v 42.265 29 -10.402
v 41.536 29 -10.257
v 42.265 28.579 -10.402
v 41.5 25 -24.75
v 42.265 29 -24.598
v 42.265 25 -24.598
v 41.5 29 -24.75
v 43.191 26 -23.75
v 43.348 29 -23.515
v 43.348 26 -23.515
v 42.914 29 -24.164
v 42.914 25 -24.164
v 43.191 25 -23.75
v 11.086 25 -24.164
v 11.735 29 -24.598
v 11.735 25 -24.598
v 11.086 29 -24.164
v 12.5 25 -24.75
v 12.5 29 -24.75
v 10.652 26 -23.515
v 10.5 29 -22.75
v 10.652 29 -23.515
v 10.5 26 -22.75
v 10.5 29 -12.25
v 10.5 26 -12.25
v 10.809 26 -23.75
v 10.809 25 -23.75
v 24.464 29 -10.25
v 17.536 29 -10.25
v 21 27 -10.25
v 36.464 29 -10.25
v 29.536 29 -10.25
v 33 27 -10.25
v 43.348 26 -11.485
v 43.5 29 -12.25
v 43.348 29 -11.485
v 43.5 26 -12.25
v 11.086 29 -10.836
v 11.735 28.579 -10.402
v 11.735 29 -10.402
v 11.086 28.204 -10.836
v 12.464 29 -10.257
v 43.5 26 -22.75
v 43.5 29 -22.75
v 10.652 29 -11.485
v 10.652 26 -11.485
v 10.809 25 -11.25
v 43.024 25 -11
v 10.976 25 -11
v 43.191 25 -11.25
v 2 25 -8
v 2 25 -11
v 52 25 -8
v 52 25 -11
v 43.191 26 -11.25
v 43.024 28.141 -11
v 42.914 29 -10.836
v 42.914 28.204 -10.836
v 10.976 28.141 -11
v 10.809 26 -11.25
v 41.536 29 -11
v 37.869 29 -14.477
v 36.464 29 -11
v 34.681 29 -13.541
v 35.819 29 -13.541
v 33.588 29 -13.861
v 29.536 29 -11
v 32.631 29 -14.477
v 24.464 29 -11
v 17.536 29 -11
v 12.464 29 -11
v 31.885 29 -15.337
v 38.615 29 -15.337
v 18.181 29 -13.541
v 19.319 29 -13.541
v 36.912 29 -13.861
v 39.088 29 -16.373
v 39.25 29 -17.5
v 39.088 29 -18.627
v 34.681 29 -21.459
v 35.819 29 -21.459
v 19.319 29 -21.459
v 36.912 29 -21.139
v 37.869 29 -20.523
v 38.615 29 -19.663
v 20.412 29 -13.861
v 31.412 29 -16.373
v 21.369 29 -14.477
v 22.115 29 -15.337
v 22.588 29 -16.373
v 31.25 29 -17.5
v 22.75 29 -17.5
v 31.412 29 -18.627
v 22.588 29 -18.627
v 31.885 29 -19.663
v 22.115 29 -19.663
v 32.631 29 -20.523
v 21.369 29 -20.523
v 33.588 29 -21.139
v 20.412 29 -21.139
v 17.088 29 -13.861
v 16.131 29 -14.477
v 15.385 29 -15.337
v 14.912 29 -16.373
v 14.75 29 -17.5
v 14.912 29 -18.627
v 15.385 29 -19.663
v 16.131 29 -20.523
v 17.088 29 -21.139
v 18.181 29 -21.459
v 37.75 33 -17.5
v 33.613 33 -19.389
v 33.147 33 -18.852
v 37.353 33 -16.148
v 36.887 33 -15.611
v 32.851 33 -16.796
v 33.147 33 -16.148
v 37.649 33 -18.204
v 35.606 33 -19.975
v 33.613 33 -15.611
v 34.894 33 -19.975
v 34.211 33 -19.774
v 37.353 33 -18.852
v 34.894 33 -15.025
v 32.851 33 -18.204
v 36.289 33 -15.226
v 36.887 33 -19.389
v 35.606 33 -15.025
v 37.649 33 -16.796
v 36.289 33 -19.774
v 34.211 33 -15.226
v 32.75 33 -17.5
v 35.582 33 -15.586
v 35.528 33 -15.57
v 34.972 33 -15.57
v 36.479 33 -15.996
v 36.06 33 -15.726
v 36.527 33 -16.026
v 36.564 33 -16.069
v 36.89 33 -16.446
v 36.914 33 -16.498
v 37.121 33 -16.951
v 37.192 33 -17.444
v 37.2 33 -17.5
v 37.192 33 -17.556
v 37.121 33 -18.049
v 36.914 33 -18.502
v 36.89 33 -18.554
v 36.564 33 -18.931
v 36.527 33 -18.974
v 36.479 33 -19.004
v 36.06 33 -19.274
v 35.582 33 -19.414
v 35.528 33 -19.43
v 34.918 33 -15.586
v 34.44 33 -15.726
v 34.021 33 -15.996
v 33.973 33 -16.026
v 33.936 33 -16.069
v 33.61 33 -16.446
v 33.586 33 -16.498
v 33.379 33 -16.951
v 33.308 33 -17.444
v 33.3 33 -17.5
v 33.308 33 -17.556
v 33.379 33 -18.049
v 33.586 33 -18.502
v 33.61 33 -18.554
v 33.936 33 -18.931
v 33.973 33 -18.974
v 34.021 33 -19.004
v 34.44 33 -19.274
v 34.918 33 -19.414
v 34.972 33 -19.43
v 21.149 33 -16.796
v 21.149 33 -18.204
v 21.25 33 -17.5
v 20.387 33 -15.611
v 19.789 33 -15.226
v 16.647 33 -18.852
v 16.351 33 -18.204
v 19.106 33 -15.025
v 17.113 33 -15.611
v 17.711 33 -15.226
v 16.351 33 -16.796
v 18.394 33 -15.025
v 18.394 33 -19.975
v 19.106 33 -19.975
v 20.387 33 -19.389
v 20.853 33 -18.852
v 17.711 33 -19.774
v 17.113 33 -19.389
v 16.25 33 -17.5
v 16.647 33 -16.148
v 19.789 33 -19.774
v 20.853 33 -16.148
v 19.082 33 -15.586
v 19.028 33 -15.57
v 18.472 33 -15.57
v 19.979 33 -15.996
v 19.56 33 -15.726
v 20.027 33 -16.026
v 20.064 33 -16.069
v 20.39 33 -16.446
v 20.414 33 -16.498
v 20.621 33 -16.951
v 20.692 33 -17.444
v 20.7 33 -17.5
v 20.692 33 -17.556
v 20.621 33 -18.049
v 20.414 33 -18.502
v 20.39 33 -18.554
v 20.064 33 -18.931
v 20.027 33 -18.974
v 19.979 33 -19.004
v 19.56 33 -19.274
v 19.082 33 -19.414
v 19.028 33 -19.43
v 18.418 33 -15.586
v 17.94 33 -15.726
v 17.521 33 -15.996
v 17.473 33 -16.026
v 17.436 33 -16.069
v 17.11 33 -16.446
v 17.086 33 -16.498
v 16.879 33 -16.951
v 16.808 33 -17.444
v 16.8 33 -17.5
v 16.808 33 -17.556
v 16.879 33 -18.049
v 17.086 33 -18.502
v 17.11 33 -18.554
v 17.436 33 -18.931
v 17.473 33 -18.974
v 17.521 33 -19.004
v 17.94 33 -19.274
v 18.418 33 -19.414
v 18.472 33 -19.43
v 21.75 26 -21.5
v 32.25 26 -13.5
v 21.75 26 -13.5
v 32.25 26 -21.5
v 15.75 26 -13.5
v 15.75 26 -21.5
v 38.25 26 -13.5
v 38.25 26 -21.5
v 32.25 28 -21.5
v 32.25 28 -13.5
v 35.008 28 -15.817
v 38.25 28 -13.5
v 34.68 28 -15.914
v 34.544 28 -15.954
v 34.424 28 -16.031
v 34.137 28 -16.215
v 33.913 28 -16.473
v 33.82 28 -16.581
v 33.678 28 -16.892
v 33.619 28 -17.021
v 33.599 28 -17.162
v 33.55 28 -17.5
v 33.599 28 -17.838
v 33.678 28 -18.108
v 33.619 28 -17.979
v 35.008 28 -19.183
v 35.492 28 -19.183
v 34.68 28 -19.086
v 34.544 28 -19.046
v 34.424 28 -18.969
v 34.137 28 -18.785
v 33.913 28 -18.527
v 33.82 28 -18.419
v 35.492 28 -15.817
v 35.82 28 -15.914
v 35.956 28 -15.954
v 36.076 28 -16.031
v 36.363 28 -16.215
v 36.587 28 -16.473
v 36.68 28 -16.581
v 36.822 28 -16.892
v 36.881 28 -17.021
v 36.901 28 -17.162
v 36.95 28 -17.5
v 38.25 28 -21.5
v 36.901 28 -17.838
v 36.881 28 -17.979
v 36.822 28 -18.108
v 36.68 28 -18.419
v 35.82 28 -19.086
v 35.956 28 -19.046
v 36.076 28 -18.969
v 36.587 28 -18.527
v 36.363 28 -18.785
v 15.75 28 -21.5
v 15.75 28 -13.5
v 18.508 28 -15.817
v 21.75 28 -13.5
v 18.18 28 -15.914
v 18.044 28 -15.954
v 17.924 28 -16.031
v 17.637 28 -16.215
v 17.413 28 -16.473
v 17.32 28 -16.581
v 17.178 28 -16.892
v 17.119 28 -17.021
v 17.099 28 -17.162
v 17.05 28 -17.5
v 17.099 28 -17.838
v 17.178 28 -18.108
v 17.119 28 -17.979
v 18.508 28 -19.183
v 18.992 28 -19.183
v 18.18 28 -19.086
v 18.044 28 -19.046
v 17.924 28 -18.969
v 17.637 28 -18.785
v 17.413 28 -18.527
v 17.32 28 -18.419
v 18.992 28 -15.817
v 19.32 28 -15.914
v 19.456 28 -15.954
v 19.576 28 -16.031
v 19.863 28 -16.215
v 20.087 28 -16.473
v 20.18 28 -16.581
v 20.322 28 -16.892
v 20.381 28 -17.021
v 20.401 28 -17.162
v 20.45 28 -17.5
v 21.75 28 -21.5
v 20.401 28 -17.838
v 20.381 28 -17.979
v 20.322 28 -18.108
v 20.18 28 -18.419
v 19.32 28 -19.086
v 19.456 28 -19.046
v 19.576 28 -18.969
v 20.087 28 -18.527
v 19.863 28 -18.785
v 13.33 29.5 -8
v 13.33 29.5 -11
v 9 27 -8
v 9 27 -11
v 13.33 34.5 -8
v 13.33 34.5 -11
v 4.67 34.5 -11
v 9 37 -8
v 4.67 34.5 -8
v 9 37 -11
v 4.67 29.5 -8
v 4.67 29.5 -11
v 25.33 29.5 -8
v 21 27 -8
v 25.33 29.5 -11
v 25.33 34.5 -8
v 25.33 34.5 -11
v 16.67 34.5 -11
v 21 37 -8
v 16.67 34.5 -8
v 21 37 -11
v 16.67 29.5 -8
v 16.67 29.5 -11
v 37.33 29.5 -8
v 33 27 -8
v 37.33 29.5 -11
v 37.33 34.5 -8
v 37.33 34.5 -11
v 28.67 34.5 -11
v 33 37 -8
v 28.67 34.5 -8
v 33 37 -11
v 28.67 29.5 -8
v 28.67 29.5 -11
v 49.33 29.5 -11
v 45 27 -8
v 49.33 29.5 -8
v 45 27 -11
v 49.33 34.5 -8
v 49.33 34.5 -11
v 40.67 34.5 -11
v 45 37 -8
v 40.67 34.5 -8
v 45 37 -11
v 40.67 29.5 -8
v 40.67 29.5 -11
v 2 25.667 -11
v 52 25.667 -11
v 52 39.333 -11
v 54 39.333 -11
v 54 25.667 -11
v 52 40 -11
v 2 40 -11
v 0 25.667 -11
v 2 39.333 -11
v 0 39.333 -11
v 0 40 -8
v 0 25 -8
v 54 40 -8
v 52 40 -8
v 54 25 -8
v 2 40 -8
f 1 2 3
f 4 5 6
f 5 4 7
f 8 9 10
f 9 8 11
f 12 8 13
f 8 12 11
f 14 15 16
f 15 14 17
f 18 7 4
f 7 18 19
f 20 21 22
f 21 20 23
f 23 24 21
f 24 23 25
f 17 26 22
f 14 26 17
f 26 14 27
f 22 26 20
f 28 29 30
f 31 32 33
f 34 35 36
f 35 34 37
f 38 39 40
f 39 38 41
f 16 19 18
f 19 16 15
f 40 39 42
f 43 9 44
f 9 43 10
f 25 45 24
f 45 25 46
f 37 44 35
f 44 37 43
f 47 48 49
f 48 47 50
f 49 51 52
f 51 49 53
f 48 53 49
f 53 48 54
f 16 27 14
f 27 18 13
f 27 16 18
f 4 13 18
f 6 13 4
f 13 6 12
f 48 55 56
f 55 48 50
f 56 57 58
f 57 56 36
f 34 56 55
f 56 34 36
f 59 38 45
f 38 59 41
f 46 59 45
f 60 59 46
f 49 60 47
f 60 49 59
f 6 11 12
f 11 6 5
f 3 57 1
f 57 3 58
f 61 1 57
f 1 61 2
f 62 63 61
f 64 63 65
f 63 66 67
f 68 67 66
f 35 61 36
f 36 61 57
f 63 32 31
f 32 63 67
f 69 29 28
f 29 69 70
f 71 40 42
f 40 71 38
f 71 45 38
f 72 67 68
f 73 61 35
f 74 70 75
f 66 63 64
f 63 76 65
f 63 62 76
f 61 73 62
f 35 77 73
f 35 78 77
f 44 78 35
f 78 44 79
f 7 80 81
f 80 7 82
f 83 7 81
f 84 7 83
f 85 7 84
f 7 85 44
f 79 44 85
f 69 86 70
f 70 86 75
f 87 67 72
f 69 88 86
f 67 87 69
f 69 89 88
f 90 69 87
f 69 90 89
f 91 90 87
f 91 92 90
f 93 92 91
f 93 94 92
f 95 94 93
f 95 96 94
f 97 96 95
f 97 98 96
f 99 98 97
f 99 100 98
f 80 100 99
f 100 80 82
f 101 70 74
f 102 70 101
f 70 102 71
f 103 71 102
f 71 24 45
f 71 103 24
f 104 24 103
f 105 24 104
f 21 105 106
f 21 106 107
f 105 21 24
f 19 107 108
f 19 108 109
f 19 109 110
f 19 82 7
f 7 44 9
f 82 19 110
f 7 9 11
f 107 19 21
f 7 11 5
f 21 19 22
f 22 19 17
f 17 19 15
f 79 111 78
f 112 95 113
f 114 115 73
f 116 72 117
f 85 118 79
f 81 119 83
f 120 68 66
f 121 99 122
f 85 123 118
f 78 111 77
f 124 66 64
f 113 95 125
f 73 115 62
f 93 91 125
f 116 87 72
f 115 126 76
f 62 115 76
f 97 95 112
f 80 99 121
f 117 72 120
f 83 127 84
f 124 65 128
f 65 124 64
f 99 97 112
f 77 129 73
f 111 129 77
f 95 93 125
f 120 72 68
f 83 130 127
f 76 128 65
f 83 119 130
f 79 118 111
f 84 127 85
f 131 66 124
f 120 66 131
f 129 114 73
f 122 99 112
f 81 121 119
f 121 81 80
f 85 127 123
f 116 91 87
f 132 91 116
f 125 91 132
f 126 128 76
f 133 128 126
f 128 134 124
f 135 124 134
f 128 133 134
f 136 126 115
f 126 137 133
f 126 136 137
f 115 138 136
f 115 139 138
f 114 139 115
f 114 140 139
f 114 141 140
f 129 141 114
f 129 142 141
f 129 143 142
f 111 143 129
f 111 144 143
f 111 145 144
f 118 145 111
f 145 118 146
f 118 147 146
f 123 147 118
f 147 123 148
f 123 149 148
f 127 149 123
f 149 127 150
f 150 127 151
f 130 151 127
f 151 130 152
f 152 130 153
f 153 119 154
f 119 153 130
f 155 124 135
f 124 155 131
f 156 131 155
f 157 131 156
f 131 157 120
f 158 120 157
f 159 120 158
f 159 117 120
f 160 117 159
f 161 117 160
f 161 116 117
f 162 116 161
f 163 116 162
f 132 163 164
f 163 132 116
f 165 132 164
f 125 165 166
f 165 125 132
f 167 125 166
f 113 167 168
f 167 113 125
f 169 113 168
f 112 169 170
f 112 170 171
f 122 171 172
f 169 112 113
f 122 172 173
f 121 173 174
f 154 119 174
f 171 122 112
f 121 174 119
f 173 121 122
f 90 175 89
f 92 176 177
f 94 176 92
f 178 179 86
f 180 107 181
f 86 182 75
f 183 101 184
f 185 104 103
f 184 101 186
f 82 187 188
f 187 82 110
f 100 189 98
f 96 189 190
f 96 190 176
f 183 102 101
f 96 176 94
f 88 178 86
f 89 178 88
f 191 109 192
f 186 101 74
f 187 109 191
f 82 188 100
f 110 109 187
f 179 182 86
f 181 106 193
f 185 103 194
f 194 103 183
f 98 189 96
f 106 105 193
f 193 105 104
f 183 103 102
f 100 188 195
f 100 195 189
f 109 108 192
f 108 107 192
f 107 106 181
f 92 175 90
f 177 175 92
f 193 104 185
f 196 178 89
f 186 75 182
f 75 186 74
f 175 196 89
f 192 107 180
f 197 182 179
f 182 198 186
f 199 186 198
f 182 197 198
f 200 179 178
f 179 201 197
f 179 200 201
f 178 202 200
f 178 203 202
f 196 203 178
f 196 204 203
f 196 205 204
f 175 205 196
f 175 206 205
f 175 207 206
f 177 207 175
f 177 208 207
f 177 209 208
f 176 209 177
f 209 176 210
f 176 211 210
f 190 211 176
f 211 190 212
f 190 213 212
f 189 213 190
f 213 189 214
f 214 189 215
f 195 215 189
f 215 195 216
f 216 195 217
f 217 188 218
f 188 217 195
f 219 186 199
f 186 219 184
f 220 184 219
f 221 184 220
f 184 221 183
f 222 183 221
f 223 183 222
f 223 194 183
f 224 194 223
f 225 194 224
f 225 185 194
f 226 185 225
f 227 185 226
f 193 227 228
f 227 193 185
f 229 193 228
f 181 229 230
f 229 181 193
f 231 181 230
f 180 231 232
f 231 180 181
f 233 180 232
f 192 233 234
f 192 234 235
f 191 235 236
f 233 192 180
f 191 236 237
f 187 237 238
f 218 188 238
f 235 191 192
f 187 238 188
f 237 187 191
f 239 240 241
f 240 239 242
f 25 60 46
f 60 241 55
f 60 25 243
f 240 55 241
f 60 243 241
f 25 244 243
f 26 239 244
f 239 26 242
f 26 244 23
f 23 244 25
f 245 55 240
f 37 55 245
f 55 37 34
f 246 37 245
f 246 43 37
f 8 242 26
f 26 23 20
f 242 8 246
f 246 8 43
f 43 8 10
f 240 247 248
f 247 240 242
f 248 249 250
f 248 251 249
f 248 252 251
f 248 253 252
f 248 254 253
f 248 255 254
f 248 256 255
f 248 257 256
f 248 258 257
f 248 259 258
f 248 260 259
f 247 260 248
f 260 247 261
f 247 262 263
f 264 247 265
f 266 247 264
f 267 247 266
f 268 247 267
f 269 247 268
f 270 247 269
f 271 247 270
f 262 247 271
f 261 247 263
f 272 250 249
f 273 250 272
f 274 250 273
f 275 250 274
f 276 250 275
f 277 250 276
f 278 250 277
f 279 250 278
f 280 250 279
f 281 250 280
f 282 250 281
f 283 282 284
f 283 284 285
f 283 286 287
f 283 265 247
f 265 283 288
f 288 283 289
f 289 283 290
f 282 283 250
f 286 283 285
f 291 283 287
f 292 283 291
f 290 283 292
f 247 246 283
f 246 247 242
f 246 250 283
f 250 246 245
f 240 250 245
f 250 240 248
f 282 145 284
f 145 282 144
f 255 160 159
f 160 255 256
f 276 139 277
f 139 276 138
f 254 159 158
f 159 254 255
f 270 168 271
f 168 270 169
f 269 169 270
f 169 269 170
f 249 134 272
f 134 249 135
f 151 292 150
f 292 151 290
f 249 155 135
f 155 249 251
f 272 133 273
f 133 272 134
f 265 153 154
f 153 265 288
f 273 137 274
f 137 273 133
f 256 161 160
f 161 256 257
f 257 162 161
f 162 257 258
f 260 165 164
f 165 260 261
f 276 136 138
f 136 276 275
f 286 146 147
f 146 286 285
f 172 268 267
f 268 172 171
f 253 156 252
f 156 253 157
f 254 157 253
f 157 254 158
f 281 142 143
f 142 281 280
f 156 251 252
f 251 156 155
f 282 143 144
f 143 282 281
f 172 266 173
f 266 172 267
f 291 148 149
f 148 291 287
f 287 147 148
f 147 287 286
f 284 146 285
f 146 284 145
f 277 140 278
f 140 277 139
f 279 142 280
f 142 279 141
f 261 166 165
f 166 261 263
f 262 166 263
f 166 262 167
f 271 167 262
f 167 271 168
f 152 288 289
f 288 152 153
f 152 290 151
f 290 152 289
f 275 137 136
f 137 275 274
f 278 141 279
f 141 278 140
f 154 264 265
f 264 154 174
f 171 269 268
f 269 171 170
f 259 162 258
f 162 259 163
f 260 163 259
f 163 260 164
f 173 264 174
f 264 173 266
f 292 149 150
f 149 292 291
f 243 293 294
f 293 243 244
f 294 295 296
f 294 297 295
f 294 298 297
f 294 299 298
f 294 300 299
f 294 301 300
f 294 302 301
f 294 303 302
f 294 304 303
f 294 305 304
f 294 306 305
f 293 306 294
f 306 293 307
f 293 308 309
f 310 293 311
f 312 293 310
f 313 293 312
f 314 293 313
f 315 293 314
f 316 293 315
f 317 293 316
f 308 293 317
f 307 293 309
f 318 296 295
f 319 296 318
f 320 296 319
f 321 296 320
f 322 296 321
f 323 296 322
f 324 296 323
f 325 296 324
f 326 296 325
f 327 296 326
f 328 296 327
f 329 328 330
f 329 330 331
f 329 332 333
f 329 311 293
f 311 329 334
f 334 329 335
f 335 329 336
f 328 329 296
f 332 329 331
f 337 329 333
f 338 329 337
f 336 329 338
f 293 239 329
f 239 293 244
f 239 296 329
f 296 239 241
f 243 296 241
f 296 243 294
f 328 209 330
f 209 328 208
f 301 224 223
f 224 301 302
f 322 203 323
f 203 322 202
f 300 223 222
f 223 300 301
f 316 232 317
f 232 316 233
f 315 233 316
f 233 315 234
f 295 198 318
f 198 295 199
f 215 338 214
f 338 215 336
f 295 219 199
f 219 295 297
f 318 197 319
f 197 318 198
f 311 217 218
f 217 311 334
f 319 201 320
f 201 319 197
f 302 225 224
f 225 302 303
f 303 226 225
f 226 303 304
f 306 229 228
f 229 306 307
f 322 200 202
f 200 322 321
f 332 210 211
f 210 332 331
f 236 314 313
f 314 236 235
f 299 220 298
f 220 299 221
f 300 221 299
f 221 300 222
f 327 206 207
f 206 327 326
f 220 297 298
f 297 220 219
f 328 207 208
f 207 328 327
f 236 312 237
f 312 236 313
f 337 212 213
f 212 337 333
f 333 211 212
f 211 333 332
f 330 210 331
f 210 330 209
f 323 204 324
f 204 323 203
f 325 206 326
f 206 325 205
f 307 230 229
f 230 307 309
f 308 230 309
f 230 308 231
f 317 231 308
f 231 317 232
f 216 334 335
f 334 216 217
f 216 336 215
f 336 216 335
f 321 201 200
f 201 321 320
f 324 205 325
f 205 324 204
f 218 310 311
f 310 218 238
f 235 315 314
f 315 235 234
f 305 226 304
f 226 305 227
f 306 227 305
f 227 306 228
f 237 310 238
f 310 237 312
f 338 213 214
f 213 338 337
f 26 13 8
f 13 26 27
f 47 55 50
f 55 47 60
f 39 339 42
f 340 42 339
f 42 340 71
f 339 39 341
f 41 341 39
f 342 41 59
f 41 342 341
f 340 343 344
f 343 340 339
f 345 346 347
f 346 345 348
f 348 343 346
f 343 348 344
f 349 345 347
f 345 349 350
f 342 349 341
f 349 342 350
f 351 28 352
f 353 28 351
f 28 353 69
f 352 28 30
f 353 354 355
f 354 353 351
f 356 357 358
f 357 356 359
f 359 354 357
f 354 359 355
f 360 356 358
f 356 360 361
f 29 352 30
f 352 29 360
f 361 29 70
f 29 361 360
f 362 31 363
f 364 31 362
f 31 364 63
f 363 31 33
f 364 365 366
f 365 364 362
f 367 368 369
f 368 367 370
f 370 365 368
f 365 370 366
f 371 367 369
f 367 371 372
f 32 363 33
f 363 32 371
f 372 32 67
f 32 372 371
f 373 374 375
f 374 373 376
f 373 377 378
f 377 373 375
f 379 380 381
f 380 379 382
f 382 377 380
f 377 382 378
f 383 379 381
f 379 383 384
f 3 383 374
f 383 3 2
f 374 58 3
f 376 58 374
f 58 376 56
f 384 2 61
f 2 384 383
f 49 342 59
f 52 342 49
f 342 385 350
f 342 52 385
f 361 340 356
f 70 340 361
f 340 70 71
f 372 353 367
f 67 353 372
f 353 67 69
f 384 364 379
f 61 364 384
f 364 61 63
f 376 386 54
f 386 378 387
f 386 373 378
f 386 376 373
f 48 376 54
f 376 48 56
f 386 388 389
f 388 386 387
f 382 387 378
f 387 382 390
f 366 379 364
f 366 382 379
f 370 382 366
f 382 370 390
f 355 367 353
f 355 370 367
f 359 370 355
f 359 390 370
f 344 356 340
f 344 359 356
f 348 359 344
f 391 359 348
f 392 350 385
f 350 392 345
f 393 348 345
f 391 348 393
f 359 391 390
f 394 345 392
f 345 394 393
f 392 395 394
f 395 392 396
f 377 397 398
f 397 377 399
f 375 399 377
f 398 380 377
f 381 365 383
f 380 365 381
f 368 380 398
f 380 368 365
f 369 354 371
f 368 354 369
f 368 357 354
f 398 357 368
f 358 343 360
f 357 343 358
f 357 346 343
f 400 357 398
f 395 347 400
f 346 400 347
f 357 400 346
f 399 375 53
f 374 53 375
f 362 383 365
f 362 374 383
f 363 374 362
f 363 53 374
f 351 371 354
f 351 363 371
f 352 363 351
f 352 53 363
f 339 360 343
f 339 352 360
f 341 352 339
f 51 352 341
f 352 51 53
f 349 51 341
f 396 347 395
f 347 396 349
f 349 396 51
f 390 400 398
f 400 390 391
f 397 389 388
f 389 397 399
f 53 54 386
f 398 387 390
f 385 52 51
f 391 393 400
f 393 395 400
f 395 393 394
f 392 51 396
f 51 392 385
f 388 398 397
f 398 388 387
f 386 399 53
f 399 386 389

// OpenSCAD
// BB-3c
// This is the mount for LED strip

tol=0.25;
extra=4;


translate([27,25,-17.5]) rotate([-90,0,0])
difference(){
    union(){
        // Main bar
        linear_extrude(height=2,scale=1) 
        offset(r=2,$fn=16) offset(r=-2,$fn=16)
        square(size=[33,14.5],center=true);

        translate([0,0,2])    
        linear_extrude(height=2,scale=1) 
        offset(r=2,$fn=16) offset(r=-2,$fn=16)
        square(size=[33,14.5],center=true);
        
    translate([16.5/2,0,4]) cylinder(r1=4,r2=2.5,h=4,$fn=22);
    translate([-16.5/2,0,4]) cylinder(r1=4,r2=2.5,h=4,$fn=22);
    
    }
    
    // Channel for tape
    translate([0,0,0])
    linear_extrude(height=1) square(size=[54,12.5],center=true);
    
    // Cutouts for LED bodies
    translate([16.5/2,0,1]){
        linear_extrude(height=2) square(size=[6,8],center=true);
        cylinder(r1=1.6,r2=2,h=8,$fn=22);
    }

    translate([-16.5/2,0,1]){
        linear_extrude(height=2) square(size=[6,8],center=true);
        cylinder(r1=1.6,r2=2,h=8,$fn=22);
    }

}

difference(){

// Bar
    difference(){
    translate ([0,25,-11]) color("pink") 
        linear_extrude(height=3) 
        square(size=[54, 15]);
i=0;
N=4;
    for(i=[0:1:N-1])
        translate([9+12*i,32,-11]) 
        rotate([0,0,30]) cylinder(r=5,h=10,center=true,$fn=6);
}

difference(){   // cut the board and components out of 
    // the base plate #1
    union(){
        // Base 1 plate
        B1p=[ [0,0], [54,0], [54,70], [44,80],
        [10,80], [0,70] ];
        translate([0,0,0]) color("gray")
        linear_extrude(height=4.5)
        polygon(points=B1p);

        // Switch mounts
        translate ([0,0,-11]) color("red") 
            linear_extrude(height=11) 
            square(size=[54, 2]);

        // Bottom side outer rail
        translate ([0,0,-11.5]) color("red") 
        difference(){
            linear_extrude(height=11.5,convexity=100) polygon(points=B1p);
            linear_extrude(height=12,convexity=100) offset(r=-2) polygon(points=B1p);
        }
        
        // Bottom side battery rail
        translate ([8.5,16,-5]) color("red") 
        difference(){
            linear_extrude(height=5,convexity=100) offset(r=1) square(size=[37,60.5]);
            linear_extrude(height=10,convexity=100) square(size=[37,60.5]);
        }
        // Reinforce LED 4 pin connector
        translate([2,52,-2])
            linear_extrude(height=2) square(size=[6,16]);


    }
    
    // Cutouts in the bottom outer rail to support fiber crossbar
        ps1=[ [0,0], [15,0], [14,4.5], [1,4.5] ];

        translate ([0,40,-8]) color("cyan") 
        rotate([-90,0,-90]) linear_extrude(height=2) polygon(points=ps1);
        translate ([52,40,-8]) color("cyan") 
        rotate([-90,0,-90]) linear_extrude(height=2) polygon(points=ps1);

        translate ([0,65,-8]) color("cyan") 
        rotate([-90,0,-90]) linear_extrude(height=2) polygon(points=ps1);
        translate ([52,65,-8]) color("cyan") 
        rotate([-90,0,-90]) linear_extrude(height=2) polygon(points=ps1);

// Thru hole for wiring left
    translate([4.75,45,-6]) color("black") {
        linear_extrude(height=12) 
        offset(r=1,$fn=8) square(size=[3.25,10],center=true);
    }
// Thru hole for wiring lower right
    translate([50,38,-6]) color("black") {
        linear_extrude(height=12) 
        offset(r=1,$fn=8) square(size=[1,10]);
    }
// Thru hole for wiring upper right
    translate([50.5,53,-6]) color("black") {
        linear_extrude(height=12) 
        offset(r=1,$fn=8) square(size=[0.5,16]);
    }


// Hole for the mic        
translate([28.9,9.5,0]) color("black") 
cylinder(r=3,h=14,$fn=16,center=true);

// Hole for the photosensor
translate([40,78,-8]) color("cyan") 
rotate([90,0,0]) cylinder(r=2.1,h=4,$fn=16,center=true);

// Led holes
translate([16,78,-8]) color("cyan") 
rotate([90,0,0]) cylinder(r=2.8,h=4,$fn=16,center=true);
translate([24,78,-8]) color("cyan") 
rotate([90,0,0]) cylinder(r=2.8,h=4,$fn=16,center=true);
translate([32,78,-8]) color("cyan") 
rotate([90,0,0]) cylinder(r=2.8,h=4,$fn=16,center=true);

// Grooves in the side walls
    pg1=[ [0,0], [2,2], [0,4] ];
    translate([-1,80,-2]) rotate([90,0,0]) color("black") 
    linear_extrude(height=80,convexity=20) polygon(points=pg1);

    translate([55,80,2]) rotate([90,180,0]) color("pink") 
    linear_extrude(height=80,convexity=20) polygon(points=pg1);

} // end of diffence  =================================


  }

/*
// add text for Version
translate ([16,43,3.5]) color("red") 
    linear_extrude(height=1.5){
    text("3C", font = "Open Sans:style=Bold", size=6,halign="center",valign="center",spacing=1.1);
    }

*/
